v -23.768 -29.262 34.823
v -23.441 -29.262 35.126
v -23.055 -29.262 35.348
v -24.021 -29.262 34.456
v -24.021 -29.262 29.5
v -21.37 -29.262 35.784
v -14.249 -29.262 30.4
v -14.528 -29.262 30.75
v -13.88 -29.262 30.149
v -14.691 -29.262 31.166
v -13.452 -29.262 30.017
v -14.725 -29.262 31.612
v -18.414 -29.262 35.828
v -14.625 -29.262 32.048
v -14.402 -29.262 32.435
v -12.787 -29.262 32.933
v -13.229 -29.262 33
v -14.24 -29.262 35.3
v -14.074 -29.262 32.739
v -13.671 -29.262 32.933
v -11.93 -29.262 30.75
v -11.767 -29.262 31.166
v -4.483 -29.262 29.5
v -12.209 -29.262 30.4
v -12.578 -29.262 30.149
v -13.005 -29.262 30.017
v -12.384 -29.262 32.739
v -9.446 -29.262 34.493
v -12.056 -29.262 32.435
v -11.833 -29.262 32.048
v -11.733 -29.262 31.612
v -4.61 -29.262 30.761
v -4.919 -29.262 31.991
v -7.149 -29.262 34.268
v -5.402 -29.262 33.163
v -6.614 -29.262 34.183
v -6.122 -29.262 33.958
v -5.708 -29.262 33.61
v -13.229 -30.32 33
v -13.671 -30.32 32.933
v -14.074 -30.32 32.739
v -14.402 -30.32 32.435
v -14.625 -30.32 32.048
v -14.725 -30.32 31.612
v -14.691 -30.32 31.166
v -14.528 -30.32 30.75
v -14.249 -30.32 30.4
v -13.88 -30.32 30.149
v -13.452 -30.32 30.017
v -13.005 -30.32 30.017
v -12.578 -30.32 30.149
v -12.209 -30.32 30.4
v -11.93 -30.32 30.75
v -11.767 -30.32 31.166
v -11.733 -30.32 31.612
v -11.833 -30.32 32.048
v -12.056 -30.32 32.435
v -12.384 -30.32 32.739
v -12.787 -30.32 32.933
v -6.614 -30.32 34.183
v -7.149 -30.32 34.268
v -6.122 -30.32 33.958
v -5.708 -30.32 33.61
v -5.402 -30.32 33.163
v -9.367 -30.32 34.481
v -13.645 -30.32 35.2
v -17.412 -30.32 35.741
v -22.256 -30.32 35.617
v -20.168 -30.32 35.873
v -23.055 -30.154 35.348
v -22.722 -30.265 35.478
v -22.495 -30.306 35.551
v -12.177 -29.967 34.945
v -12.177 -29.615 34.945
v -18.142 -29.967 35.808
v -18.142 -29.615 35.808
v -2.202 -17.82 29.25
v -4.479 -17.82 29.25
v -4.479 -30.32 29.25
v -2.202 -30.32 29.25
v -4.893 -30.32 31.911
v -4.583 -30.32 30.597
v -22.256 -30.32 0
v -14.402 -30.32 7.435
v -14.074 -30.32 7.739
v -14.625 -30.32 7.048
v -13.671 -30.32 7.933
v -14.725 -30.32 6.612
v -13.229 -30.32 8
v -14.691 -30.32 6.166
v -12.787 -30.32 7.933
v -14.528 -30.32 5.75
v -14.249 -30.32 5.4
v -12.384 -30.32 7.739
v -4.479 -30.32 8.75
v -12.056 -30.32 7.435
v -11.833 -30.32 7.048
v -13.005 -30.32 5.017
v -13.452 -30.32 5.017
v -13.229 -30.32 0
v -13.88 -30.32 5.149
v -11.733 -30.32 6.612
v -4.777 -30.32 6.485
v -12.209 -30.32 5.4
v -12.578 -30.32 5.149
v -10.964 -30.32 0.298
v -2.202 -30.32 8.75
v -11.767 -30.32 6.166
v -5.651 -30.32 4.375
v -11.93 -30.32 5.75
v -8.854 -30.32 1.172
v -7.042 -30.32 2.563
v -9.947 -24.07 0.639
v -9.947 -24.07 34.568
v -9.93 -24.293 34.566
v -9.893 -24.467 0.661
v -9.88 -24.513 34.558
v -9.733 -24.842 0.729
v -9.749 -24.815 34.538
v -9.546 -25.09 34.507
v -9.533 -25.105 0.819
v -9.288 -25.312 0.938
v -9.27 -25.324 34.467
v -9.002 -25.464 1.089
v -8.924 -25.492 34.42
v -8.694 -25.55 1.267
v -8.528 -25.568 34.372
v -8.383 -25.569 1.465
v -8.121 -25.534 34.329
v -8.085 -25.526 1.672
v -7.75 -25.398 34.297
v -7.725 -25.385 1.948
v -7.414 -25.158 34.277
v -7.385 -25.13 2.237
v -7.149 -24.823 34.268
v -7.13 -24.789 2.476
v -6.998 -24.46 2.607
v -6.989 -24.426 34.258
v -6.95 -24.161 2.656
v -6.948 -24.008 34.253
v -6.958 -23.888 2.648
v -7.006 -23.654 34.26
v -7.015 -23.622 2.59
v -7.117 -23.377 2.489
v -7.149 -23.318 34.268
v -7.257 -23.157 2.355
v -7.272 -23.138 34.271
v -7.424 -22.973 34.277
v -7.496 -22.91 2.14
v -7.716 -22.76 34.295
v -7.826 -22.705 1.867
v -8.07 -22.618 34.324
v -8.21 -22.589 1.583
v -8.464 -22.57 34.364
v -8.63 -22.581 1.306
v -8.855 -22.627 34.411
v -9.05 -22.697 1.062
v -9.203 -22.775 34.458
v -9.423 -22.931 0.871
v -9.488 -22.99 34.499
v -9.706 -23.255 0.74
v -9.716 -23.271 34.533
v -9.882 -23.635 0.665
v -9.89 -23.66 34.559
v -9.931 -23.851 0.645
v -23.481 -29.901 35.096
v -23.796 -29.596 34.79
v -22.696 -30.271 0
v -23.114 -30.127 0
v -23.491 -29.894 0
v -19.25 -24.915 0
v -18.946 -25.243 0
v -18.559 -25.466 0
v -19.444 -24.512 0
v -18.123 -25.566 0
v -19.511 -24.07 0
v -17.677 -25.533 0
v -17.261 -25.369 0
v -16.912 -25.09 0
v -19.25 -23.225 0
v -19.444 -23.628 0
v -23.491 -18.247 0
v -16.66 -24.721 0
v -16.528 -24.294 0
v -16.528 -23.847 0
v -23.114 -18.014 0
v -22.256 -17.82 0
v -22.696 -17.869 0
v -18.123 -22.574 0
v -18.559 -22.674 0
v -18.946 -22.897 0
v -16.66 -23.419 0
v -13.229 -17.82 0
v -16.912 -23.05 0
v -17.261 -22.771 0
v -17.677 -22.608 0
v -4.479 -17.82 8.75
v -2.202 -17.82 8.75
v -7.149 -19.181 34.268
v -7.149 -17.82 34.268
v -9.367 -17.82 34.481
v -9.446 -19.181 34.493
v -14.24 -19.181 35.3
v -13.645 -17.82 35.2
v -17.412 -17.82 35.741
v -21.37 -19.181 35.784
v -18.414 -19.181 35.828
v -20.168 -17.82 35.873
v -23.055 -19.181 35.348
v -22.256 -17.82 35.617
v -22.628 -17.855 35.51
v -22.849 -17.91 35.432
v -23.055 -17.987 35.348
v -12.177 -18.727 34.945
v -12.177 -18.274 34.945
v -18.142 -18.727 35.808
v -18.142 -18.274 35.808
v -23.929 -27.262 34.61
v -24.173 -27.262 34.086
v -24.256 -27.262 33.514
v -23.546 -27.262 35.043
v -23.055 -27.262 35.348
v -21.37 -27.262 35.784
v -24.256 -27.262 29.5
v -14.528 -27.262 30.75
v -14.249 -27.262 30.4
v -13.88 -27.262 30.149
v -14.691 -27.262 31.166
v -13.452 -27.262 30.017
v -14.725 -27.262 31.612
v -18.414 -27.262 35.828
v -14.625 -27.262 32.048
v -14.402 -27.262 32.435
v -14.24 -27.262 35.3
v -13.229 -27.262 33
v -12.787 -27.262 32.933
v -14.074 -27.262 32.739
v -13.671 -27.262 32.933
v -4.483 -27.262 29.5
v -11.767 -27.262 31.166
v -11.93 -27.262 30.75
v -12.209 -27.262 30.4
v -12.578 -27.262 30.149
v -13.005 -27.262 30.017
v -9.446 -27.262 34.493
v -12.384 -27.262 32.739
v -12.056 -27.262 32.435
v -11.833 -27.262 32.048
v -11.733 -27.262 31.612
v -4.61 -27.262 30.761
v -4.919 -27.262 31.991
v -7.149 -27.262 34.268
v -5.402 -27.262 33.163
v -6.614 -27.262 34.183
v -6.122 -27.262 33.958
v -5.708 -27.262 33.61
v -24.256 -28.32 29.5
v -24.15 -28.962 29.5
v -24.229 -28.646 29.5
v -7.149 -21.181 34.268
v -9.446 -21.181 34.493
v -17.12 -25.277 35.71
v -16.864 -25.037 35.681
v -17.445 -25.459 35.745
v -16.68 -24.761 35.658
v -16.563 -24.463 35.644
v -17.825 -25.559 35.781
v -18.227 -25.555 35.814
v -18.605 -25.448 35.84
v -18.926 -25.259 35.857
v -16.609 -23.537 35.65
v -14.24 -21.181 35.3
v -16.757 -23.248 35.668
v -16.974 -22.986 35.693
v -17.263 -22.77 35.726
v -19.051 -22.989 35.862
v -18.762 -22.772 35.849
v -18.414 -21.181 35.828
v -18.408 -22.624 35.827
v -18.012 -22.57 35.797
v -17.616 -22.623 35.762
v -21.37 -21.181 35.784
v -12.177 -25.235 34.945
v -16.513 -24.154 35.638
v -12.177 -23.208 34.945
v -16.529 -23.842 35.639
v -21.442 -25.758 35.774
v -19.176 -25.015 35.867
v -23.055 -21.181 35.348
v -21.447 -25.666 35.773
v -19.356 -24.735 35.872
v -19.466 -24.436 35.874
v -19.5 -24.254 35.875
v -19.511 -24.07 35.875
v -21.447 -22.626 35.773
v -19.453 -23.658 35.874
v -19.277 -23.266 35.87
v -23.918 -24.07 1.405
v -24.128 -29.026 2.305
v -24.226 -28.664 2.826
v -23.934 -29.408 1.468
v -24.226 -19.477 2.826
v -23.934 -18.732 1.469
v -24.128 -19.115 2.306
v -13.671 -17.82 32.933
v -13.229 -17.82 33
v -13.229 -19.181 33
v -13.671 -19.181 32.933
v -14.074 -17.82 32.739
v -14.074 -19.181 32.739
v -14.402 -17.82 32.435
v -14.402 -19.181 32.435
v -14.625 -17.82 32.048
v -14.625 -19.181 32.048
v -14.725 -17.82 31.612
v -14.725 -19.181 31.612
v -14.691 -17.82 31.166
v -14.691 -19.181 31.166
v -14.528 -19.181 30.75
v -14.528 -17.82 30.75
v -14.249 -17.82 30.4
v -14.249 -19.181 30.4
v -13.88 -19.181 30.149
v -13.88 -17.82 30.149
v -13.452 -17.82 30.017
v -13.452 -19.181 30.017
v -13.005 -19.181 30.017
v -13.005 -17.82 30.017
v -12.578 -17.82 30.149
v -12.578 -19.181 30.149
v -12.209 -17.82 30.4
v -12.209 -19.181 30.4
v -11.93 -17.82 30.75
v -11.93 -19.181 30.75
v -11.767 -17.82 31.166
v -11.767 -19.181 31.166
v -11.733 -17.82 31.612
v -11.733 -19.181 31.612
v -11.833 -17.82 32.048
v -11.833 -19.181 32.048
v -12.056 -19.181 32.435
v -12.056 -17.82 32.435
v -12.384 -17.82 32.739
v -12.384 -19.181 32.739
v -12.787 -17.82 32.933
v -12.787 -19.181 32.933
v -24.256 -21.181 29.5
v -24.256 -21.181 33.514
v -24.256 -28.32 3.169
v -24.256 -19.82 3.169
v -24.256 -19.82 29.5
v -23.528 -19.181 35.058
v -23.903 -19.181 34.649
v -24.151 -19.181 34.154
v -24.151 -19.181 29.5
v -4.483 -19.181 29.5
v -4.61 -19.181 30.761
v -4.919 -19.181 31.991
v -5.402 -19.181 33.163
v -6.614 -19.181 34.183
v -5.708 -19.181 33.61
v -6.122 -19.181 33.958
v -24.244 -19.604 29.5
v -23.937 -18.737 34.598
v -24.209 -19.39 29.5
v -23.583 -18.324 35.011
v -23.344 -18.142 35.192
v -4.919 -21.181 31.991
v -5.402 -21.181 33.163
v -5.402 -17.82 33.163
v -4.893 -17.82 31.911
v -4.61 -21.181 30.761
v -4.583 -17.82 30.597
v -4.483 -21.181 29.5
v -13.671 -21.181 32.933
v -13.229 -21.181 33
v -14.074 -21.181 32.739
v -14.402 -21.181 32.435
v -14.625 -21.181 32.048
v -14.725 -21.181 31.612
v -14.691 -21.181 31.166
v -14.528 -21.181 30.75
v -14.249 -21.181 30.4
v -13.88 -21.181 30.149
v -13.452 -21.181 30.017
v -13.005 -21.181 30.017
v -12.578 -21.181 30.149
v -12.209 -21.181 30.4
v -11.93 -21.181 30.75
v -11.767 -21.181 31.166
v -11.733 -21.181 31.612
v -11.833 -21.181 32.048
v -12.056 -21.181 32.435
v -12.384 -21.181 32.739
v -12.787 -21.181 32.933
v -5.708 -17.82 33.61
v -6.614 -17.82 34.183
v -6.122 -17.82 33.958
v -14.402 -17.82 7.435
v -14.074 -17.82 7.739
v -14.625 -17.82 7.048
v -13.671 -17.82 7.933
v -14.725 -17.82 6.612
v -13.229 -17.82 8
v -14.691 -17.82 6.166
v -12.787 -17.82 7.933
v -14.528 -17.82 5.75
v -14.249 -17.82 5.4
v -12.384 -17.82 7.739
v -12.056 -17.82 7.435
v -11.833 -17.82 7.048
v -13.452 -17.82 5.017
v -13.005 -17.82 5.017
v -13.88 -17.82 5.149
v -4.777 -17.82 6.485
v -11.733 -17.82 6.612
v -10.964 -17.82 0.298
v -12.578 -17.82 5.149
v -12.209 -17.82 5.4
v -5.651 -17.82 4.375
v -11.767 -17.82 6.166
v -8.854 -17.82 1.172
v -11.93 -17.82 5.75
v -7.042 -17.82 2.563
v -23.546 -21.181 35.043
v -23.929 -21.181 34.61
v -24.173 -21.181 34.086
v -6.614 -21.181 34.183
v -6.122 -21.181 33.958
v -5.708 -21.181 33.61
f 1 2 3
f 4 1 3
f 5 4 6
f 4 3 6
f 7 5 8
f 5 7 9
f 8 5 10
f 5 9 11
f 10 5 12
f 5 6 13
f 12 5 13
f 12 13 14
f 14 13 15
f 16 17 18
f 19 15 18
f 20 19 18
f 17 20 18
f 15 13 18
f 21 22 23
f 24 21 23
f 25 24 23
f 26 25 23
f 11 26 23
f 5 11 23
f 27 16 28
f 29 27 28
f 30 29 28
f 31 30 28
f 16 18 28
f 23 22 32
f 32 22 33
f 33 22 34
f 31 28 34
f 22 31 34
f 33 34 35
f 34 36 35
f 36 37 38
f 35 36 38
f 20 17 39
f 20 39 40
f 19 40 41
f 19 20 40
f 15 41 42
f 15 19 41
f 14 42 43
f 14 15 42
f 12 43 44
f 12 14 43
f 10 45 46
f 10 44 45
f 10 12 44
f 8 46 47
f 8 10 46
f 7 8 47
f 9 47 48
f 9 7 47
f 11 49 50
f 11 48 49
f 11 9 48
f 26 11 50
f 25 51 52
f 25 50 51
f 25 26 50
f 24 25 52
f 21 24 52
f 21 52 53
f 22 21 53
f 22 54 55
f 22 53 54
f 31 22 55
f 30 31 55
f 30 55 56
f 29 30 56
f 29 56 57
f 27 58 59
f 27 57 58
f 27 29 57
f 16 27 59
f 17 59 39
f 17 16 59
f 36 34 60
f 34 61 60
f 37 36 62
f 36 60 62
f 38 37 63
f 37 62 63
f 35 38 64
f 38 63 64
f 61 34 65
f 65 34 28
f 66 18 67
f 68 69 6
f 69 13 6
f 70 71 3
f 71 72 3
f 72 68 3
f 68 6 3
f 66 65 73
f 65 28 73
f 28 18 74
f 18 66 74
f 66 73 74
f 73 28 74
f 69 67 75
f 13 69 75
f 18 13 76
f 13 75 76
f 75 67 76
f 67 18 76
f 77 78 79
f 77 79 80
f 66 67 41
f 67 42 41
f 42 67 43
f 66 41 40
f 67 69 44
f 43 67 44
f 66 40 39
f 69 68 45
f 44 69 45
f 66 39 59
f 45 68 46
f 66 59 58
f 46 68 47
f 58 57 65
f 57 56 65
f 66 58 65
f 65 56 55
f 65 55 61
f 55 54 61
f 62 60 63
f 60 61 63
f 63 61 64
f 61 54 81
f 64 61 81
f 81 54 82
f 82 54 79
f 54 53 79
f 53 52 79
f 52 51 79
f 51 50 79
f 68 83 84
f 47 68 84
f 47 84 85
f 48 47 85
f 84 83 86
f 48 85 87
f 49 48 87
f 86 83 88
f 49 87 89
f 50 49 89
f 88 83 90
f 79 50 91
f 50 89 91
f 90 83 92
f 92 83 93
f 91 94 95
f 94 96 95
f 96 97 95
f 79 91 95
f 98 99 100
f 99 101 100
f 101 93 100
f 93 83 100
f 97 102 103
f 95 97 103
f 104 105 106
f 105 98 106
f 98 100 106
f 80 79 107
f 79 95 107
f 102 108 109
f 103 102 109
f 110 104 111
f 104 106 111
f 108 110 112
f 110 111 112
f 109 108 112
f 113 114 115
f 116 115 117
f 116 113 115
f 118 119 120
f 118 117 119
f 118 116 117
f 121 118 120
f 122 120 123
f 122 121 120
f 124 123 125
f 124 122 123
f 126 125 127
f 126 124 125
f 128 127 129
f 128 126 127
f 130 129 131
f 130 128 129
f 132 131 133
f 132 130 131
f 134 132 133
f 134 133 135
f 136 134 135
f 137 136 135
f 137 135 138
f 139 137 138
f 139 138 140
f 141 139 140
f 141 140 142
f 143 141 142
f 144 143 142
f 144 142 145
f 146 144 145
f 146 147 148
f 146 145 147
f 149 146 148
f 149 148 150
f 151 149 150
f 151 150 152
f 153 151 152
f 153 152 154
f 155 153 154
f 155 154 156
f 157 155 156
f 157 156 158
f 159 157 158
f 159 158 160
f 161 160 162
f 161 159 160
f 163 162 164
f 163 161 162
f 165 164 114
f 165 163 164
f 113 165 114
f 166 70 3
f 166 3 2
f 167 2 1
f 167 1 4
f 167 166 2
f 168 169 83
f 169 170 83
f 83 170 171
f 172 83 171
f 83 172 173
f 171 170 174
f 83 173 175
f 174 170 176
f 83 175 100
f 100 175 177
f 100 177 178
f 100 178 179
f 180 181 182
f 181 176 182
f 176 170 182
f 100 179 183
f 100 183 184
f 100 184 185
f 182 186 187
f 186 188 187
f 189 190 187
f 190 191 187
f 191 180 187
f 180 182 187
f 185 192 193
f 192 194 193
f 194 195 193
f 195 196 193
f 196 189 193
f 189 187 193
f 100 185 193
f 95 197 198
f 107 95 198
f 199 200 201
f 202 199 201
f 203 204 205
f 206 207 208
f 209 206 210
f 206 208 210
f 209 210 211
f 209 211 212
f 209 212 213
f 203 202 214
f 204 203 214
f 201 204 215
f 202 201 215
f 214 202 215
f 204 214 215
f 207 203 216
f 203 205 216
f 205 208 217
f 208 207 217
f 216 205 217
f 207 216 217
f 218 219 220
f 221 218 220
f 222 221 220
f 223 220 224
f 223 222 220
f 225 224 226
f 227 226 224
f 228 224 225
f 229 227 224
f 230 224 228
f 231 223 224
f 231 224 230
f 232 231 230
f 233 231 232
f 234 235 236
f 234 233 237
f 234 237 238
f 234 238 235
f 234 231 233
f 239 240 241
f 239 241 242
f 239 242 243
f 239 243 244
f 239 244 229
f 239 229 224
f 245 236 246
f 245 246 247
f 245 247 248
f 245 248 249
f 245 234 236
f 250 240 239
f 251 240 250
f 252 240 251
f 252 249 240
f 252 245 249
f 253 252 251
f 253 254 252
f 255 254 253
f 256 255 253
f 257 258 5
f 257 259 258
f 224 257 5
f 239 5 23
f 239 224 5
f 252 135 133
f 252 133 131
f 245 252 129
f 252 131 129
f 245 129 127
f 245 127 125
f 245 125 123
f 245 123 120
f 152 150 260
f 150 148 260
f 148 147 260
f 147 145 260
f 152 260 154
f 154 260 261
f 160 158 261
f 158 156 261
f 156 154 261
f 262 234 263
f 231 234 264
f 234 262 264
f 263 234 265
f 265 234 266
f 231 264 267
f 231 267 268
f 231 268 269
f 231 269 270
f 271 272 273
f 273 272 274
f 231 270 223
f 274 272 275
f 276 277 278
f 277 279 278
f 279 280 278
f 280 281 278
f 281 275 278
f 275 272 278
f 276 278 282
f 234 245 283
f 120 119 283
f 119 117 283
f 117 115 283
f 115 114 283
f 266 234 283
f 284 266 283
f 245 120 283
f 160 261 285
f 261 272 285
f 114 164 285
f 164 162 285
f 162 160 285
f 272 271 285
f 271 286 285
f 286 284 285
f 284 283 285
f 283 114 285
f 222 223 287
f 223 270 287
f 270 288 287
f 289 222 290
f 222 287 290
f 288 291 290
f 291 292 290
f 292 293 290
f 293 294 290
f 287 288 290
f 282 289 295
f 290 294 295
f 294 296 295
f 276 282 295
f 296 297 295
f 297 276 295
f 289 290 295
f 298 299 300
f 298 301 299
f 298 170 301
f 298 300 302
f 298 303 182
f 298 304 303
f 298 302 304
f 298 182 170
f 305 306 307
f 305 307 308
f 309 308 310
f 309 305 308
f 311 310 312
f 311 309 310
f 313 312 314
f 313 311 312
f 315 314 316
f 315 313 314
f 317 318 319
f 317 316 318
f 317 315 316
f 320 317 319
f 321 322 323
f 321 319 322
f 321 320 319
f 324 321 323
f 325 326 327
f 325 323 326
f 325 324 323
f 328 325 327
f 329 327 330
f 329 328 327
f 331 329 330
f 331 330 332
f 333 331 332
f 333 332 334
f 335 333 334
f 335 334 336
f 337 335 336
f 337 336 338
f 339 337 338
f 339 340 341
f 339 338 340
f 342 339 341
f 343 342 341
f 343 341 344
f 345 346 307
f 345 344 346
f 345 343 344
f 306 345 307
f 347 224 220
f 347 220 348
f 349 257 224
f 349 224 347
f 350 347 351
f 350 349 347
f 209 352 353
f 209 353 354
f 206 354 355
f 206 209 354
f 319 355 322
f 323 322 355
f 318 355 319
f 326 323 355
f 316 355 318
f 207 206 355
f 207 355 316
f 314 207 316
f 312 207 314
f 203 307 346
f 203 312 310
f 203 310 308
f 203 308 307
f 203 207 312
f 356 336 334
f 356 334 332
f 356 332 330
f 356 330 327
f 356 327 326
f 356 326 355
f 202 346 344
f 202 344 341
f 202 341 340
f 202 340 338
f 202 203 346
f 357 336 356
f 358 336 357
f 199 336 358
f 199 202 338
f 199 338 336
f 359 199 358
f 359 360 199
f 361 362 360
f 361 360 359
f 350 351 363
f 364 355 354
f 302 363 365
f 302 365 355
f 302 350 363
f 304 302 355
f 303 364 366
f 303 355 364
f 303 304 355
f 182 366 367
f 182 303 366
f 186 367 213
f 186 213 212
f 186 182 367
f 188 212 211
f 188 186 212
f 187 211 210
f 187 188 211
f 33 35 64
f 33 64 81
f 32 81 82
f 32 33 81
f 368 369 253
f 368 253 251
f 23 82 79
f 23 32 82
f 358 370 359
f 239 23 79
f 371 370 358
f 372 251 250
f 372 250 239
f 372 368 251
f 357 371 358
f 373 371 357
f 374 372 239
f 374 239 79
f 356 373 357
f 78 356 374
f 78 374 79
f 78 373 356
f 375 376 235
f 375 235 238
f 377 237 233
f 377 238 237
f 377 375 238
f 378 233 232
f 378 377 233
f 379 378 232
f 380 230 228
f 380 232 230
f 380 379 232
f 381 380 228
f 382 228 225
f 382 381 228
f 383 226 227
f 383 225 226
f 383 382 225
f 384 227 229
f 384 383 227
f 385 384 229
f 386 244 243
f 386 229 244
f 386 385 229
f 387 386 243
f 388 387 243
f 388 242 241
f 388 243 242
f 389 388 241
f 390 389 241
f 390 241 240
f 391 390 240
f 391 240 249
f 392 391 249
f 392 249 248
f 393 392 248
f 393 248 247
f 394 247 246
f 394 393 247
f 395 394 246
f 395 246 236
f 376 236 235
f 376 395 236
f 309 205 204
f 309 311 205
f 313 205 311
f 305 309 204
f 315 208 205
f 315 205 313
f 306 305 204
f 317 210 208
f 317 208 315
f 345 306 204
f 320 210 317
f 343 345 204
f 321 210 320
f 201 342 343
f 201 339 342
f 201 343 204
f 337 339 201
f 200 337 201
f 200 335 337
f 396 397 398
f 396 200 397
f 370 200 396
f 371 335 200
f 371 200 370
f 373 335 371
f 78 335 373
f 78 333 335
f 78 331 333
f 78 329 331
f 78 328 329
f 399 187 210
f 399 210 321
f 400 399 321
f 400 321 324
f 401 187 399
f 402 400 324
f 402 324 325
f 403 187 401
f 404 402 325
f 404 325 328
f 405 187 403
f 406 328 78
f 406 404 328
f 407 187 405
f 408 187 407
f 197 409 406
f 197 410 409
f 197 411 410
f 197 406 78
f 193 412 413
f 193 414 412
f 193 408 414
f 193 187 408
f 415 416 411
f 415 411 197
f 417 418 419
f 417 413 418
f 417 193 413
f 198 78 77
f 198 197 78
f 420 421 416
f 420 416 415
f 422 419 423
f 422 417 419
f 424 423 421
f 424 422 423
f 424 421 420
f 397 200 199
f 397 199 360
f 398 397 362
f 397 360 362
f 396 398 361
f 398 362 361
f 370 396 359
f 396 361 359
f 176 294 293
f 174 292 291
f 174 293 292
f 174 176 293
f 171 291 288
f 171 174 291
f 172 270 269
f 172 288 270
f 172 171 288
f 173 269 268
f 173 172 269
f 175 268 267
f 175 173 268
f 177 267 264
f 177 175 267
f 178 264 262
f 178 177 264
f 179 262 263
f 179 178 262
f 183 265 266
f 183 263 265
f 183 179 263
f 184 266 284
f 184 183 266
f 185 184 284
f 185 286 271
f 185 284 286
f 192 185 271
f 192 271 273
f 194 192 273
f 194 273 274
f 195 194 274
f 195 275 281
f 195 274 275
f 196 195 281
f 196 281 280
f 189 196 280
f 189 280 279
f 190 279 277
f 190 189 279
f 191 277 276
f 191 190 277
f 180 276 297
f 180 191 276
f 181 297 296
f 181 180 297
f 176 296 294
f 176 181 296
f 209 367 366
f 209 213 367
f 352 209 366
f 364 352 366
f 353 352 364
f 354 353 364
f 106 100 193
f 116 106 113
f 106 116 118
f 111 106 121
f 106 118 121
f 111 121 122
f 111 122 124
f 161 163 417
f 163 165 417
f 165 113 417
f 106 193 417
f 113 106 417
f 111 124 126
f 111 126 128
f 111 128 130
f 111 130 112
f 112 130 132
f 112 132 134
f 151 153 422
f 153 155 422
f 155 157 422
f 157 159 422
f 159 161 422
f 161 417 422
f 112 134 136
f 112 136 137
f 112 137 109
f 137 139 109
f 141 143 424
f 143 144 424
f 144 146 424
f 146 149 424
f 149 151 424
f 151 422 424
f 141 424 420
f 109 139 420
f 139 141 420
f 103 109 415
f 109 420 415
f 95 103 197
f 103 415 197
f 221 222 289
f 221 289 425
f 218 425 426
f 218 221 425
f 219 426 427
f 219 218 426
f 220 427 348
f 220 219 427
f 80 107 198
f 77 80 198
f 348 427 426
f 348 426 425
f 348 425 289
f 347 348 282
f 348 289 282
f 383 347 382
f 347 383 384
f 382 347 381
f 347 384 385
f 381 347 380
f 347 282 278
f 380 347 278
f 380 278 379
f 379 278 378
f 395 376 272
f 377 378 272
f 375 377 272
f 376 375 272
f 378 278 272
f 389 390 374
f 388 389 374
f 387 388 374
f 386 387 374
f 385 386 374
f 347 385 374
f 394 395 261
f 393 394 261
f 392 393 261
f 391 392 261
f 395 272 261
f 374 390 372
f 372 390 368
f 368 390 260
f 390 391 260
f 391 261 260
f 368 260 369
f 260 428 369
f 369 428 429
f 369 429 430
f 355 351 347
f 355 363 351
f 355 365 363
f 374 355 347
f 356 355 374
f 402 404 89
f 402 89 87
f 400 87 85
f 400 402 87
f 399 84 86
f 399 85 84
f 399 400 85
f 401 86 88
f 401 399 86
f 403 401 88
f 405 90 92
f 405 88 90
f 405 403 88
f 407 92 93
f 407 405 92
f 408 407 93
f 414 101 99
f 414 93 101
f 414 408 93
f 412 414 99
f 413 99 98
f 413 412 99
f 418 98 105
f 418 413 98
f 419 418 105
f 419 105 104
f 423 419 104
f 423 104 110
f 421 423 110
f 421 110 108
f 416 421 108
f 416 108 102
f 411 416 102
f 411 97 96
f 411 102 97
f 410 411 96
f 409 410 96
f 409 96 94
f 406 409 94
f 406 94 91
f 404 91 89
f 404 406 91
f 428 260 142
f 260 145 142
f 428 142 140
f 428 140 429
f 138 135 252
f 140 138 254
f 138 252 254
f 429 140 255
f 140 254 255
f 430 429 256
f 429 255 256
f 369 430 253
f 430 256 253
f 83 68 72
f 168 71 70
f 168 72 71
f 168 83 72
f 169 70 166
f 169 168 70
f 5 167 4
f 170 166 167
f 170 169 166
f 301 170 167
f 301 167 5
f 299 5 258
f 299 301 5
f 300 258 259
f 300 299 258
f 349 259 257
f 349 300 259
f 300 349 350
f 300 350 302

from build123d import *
from OCP.BRepAlgoAPI import BRepAlgoAPI_Cut
from OCP.TopTools import TopTools_ListOfShape

# Parameters (mm, degrees)
SKETCH1_W               = 22.054431489
SKETCH1_H               = 12.5
BOSS_EXTRUDE1_DEPTH     = 40
CUT_EXTRUDE1_DEPTH      = 10
CUT_EXTRUDE1_DEPTH_BACK = 15
SKETCH2_R               = 1.5
FILLET3_START           = -1
FILLET3_DEPTH           = 36.616951747
FILLET3_START_2         = -31
FILLET3_2_DEPTH         = 14
SKETCH5_R               = 1.5
CUT_EXTRUDE4_DEPTH      = 53.866443736
SKETCH16_W              = 22.05443149
SKETCH16_H              = 2
CUT_EXTRUDE6_DEPTH      = 8.5
FILLET4_R               = 2


with BuildPart() as part:
    # Sketch1 → Boss-Extrude1 (new body)
    with BuildSketch(Plane.XY):
        with Locations((-13.228930986, -24.070183414)):
            Rectangle(SKETCH1_W, SKETCH1_H)
    extrude(amount=BOSS_EXTRUDE1_DEPTH)

    # Sketch2 → Cut-Extrude1 (cut, two sides: drawn at the far end of the back side and taken through both)
    with BuildSketch(Plane.XZ.offset(30.320183414).offset(-CUT_EXTRUDE1_DEPTH_BACK)):
        with Locations(Location((-13.228930986, 6.5, 0), (0, 0, 90))):
            Circle(SKETCH2_R)
        with Locations(Location((-13.228930986, 31.5, 0), (0, 0, 90))):
            Circle(SKETCH2_R)
        with BuildLine():
            Line((-4.478930986, 29.25), (-2.201715242, 29.25))
            add(Edge.make_bspline(
                [(-24.256146731, 29.25), (-34.277912729, 38.417119108), (-13.227499763, 50.308047167), (7.840407292, 38.416977249), (-2.201715242, 29.25)],
                knots=[0, 0, 0, 0, 0.49986218, 1, 1, 1, 1], degree=3))
            add(Edge.make_bspline(
                [(-6.103895584, 34.329012749), (-10.720559386, 33.527203043), (-28.641384523, 40.845191705), (-24.256146731, 29.25)],
                knots=[0, 0, 0, 0, 1, 1, 1, 1], degree=3))
            ThreePointArc((-6.103895584, 34.329012749), (-4.895067543, 31.916312081), (-4.478930986, 29.25))
        make_face()
        with BuildLine():
            Line((-4.478930986, 8.75), (-2.201715242, 8.75))
            add(Edge.make_bspline(
                [(-2.201715242, 8.75), (5.39210746, 3.880294823), (-0.777052631, -4.523329032), (-17.174300591, -10.623347238), (-34.821400648, -0.026005424), (-24.256146731, 8.75)],
                knots=[0, 0, 0, 0, 0.283272691, 0.504244858, 1, 1, 1, 1], degree=3))
            add(Edge.make_bspline(
                [(-23.490579314, 0), (-24.966512963, 4.237786421), (-24.256146731, 8.75)],
                knots=[0, 0, 0, 1, 1, 1], degree=2))
            Line((-23.490579314, 0), (-13.228930986, 0))
            ThreePointArc((-13.228930986, 0), (-7.041746651, 2.562815665), (-4.478930986, 8.75))
        make_face()
    extrude(amount=CUT_EXTRUDE1_DEPTH + CUT_EXTRUDE1_DEPTH_BACK, mode=Mode.SUBTRACT)


with BuildPart() as fillet3_tool:
    # Fillet3: read off the stored shape, not the designer's step
    # Fillet3 outline → Fillet3 (new body)
    with BuildSketch(Plane.XY.offset(FILLET3_START)):
        with BuildLine():
            Line((-24.256146731, -17.820183414), (-24.256146731, -19.820183414))
            ThreePointArc((-24.256146731, -19.820183414), (-23.670360293, -18.405969851), (-22.256146731, -17.820183414))
            Line((-22.256146731, -17.820183414), (-24.256146731, -17.820183414))
        make_face()
        with BuildLine():
            ThreePointArc((-22.256146731, -30.320183414), (-23.670360293, -29.734396976), (-24.256146731, -28.320183414))
            Line((-24.256146731, -28.320183414), (-24.256146731, -30.320183414))
            Line((-24.256146731, -30.320183414), (-22.256146731, -30.320183414))
        make_face()
    extrude(amount=FILLET3_DEPTH)


with BuildPart() as part_1:
    add(part.part)

    # Fillet3: cut by fillet3_tool, with a tolerance
    fillet3_stock = TopTools_ListOfShape()
    fillet3_stock.Append(part_1.part.wrapped)
    fillet3_tools = TopTools_ListOfShape()
    fillet3_tools.Append(fillet3_tool.part.wrapped)
    fillet3_cut = BRepAlgoAPI_Cut()
    fillet3_cut.SetArguments(fillet3_stock)
    fillet3_cut.SetTools(fillet3_tools)
    fillet3_cut.SetFuzzyValue(0.00001)
    fillet3_cut.Build()
    add(Compound.cast(fillet3_cut.Shape()).solids(), mode=Mode.REPLACE)


with BuildPart() as fillet3_2_tool:
    # Fillet3 2 outline → Fillet3 2 (new body)
    with BuildSketch(Plane(origin=(0, 0, 0), x_dir=(1, 0, 0), z_dir=(0, 1, 0)).offset(FILLET3_START_2)):
        with BuildLine():
            Line((-24.256146731, -3.001504812), (-24.256146731, -3.16929397))
            ThreePointArc((-24.256146731, -3.16929397), (-24.248700679, -2.996873655), (-24.226417966, -2.82573719))
            add(Edge.make_bspline(
                [(-24.226417966, -2.82573719), (-24.241732441, -2.913564505), (-24.256146731, -3.001504812)],
                knots=[0.329874436, 0.329874436, 0.329874436, 0.350165787, 0.350165787, 0.350165787], degree=2))
        make_face()
        with BuildLine():
            ThreePointArc((-23.055175533, -35.347858737), (-23.929176558, -34.610293214), (-24.256146731, -33.5144049))
            Line((-24.256146731, -33.5144049), (-24.256146731, -34.486377393))
            add(Edge.make_bspline(
                [(-24.256146731, -34.486377393), (-23.945543724, -34.85491353), (-23.538709887, -35.137131928), (-23.055175533, -35.347858737)],
                knots=[0.223074816, 0.223074816, 0.223074816, 0.223074816, 0.304929745, 0.304929745, 0.304929745, 0.304929745], degree=3))
        make_face()
    extrude(amount=FILLET3_2_DEPTH)


with BuildPart() as part_2:
    add(part_1.part)

    # Fillet3 2: cut by fillet3_2_tool, with a tolerance
    fillet3_2_stock = TopTools_ListOfShape()
    fillet3_2_stock.Append(part_2.part.wrapped)
    fillet3_2_tools = TopTools_ListOfShape()
    fillet3_2_tools.Append(fillet3_2_tool.part.wrapped)
    fillet3_2_cut = BRepAlgoAPI_Cut()
    fillet3_2_cut.SetArguments(fillet3_2_stock)
    fillet3_2_cut.SetTools(fillet3_2_tools)
    fillet3_2_cut.SetFuzzyValue(0.00001)
    fillet3_2_cut.Build()
    add(Compound.cast(fillet3_2_cut.Shape()).solids(), mode=Mode.REPLACE)

    # Sketch5 → Cut-Extrude4 (cut, through all)
    with BuildSketch(Plane.XY):
        with Locations(Location((-18.011106811, -24.070183414, 0), (0, 0, 180))):
            Circle(SKETCH5_R)
        with Locations(Location((-8.446755162, -24.070183414, 0), (0, 0, 180))):
            Circle(SKETCH5_R)
    extrude(amount=CUT_EXTRUDE4_DEPTH, mode=Mode.SUBTRACT)

    # Sketch16 → Cut-Extrude6 (cut)
    with BuildSketch(Plane.XY.offset(38)):
        with Locations((-13.228930985, -20.1809771)):
            Rectangle(SKETCH16_W, SKETCH16_H)
        with Locations((-13.228930985, -28.261916897)):
            Rectangle(SKETCH16_W, SKETCH16_H)
    extrude(amount=-CUT_EXTRUDE6_DEPTH, mode=Mode.SUBTRACT)

    # Fillet4
    # the kernel refuses this fillet: 2 mm, written as the material it takes off along each edge
    with BuildSketch(Plane(origin=(-6.103895584, -22.583679851, 34.329012749), x_dir=(0.5153680546007453, 0, -0.8569689424343471), z_dir=(0, 1, 0))) as fillet4_piece_1:
        with BuildLine():
            CenterArc((1.205528974, 1.993941708), FILLET4_R, 212.228268917, 62.232476225)
            Line((-0.486331325, 0.927354287), (-0.520168531, 0.906022538))
            ThreePointArc((-0.520168531, 0.906022538), (-0.25689069, 0.456334761), (-0.037300681, -0.01444504))
            Line((-0.037300681, -0.01444504), (-0.003111043, -0.039878834))
            ThreePointArc((-0.003111043, -0.039878834), (0.68054055, -0.066505026), (1.364192143, -0.039878834))
            Line((1.364192143, -0.039878834), (1.3610811, 0))
        make_face()
    extrude(amount=8.166199187, mode=Mode.SUBTRACT)
    with BuildSketch(Plane(origin=(-6.103895584, -30.664619647, 34.329012749), x_dir=(0.5153680546007453, 0, -0.8569689424343471), z_dir=(0, 1, 0))) as fillet4_piece_2:
        with BuildLine():
            CenterArc((1.205528974, 1.993941708), FILLET4_R, 212.228268917, 62.232476225)
            Line((-0.486331325, 0.927354287), (-0.520168531, 0.906022538))
            ThreePointArc((-0.520168531, 0.906022538), (-0.25689069, 0.456334761), (-0.037300681, -0.01444504))
            Line((-0.037300681, -0.01444504), (-0.003111043, -0.039878834))
            ThreePointArc((-0.003111043, -0.039878834), (0.68054055, -0.066505026), (1.364192143, -0.039878834))
            Line((1.364192143, -0.039878834), (1.3610811, 0))
        make_face()
    extrude(amount=12.886345297, mode=Mode.SUBTRACT)
    with BuildSketch(Plane(origin=(-6.103895584, -33.722886164, 34.329012749), x_dir=(0.5153680546007453, 0, -0.8569689424343471), z_dir=(0, 1, 0))) as fillet4_piece_3:
        with BuildLine():
            CenterArc((1.205528974, 1.993941708), FILLET4_R, 212.228268917, 62.232476225)
            Line((-0.486331325, 0.927354287), (-0.520168531, 0.906022538))
            ThreePointArc((-0.520168531, 0.906022538), (-0.25689069, 0.456334761), (-0.037300681, -0.01444504))
            Line((-0.037300681, -0.01444504), (-0.003111043, -0.039878834))
            ThreePointArc((-0.003111043, -0.039878834), (0.68054055, -0.066505026), (1.364192143, -0.039878834))
            Line((1.364192143, -0.039878834), (1.3610811, 0))
        make_face()
    extrude(amount=7.863672018, mode=Mode.SUBTRACT)


solid = part_2.part
